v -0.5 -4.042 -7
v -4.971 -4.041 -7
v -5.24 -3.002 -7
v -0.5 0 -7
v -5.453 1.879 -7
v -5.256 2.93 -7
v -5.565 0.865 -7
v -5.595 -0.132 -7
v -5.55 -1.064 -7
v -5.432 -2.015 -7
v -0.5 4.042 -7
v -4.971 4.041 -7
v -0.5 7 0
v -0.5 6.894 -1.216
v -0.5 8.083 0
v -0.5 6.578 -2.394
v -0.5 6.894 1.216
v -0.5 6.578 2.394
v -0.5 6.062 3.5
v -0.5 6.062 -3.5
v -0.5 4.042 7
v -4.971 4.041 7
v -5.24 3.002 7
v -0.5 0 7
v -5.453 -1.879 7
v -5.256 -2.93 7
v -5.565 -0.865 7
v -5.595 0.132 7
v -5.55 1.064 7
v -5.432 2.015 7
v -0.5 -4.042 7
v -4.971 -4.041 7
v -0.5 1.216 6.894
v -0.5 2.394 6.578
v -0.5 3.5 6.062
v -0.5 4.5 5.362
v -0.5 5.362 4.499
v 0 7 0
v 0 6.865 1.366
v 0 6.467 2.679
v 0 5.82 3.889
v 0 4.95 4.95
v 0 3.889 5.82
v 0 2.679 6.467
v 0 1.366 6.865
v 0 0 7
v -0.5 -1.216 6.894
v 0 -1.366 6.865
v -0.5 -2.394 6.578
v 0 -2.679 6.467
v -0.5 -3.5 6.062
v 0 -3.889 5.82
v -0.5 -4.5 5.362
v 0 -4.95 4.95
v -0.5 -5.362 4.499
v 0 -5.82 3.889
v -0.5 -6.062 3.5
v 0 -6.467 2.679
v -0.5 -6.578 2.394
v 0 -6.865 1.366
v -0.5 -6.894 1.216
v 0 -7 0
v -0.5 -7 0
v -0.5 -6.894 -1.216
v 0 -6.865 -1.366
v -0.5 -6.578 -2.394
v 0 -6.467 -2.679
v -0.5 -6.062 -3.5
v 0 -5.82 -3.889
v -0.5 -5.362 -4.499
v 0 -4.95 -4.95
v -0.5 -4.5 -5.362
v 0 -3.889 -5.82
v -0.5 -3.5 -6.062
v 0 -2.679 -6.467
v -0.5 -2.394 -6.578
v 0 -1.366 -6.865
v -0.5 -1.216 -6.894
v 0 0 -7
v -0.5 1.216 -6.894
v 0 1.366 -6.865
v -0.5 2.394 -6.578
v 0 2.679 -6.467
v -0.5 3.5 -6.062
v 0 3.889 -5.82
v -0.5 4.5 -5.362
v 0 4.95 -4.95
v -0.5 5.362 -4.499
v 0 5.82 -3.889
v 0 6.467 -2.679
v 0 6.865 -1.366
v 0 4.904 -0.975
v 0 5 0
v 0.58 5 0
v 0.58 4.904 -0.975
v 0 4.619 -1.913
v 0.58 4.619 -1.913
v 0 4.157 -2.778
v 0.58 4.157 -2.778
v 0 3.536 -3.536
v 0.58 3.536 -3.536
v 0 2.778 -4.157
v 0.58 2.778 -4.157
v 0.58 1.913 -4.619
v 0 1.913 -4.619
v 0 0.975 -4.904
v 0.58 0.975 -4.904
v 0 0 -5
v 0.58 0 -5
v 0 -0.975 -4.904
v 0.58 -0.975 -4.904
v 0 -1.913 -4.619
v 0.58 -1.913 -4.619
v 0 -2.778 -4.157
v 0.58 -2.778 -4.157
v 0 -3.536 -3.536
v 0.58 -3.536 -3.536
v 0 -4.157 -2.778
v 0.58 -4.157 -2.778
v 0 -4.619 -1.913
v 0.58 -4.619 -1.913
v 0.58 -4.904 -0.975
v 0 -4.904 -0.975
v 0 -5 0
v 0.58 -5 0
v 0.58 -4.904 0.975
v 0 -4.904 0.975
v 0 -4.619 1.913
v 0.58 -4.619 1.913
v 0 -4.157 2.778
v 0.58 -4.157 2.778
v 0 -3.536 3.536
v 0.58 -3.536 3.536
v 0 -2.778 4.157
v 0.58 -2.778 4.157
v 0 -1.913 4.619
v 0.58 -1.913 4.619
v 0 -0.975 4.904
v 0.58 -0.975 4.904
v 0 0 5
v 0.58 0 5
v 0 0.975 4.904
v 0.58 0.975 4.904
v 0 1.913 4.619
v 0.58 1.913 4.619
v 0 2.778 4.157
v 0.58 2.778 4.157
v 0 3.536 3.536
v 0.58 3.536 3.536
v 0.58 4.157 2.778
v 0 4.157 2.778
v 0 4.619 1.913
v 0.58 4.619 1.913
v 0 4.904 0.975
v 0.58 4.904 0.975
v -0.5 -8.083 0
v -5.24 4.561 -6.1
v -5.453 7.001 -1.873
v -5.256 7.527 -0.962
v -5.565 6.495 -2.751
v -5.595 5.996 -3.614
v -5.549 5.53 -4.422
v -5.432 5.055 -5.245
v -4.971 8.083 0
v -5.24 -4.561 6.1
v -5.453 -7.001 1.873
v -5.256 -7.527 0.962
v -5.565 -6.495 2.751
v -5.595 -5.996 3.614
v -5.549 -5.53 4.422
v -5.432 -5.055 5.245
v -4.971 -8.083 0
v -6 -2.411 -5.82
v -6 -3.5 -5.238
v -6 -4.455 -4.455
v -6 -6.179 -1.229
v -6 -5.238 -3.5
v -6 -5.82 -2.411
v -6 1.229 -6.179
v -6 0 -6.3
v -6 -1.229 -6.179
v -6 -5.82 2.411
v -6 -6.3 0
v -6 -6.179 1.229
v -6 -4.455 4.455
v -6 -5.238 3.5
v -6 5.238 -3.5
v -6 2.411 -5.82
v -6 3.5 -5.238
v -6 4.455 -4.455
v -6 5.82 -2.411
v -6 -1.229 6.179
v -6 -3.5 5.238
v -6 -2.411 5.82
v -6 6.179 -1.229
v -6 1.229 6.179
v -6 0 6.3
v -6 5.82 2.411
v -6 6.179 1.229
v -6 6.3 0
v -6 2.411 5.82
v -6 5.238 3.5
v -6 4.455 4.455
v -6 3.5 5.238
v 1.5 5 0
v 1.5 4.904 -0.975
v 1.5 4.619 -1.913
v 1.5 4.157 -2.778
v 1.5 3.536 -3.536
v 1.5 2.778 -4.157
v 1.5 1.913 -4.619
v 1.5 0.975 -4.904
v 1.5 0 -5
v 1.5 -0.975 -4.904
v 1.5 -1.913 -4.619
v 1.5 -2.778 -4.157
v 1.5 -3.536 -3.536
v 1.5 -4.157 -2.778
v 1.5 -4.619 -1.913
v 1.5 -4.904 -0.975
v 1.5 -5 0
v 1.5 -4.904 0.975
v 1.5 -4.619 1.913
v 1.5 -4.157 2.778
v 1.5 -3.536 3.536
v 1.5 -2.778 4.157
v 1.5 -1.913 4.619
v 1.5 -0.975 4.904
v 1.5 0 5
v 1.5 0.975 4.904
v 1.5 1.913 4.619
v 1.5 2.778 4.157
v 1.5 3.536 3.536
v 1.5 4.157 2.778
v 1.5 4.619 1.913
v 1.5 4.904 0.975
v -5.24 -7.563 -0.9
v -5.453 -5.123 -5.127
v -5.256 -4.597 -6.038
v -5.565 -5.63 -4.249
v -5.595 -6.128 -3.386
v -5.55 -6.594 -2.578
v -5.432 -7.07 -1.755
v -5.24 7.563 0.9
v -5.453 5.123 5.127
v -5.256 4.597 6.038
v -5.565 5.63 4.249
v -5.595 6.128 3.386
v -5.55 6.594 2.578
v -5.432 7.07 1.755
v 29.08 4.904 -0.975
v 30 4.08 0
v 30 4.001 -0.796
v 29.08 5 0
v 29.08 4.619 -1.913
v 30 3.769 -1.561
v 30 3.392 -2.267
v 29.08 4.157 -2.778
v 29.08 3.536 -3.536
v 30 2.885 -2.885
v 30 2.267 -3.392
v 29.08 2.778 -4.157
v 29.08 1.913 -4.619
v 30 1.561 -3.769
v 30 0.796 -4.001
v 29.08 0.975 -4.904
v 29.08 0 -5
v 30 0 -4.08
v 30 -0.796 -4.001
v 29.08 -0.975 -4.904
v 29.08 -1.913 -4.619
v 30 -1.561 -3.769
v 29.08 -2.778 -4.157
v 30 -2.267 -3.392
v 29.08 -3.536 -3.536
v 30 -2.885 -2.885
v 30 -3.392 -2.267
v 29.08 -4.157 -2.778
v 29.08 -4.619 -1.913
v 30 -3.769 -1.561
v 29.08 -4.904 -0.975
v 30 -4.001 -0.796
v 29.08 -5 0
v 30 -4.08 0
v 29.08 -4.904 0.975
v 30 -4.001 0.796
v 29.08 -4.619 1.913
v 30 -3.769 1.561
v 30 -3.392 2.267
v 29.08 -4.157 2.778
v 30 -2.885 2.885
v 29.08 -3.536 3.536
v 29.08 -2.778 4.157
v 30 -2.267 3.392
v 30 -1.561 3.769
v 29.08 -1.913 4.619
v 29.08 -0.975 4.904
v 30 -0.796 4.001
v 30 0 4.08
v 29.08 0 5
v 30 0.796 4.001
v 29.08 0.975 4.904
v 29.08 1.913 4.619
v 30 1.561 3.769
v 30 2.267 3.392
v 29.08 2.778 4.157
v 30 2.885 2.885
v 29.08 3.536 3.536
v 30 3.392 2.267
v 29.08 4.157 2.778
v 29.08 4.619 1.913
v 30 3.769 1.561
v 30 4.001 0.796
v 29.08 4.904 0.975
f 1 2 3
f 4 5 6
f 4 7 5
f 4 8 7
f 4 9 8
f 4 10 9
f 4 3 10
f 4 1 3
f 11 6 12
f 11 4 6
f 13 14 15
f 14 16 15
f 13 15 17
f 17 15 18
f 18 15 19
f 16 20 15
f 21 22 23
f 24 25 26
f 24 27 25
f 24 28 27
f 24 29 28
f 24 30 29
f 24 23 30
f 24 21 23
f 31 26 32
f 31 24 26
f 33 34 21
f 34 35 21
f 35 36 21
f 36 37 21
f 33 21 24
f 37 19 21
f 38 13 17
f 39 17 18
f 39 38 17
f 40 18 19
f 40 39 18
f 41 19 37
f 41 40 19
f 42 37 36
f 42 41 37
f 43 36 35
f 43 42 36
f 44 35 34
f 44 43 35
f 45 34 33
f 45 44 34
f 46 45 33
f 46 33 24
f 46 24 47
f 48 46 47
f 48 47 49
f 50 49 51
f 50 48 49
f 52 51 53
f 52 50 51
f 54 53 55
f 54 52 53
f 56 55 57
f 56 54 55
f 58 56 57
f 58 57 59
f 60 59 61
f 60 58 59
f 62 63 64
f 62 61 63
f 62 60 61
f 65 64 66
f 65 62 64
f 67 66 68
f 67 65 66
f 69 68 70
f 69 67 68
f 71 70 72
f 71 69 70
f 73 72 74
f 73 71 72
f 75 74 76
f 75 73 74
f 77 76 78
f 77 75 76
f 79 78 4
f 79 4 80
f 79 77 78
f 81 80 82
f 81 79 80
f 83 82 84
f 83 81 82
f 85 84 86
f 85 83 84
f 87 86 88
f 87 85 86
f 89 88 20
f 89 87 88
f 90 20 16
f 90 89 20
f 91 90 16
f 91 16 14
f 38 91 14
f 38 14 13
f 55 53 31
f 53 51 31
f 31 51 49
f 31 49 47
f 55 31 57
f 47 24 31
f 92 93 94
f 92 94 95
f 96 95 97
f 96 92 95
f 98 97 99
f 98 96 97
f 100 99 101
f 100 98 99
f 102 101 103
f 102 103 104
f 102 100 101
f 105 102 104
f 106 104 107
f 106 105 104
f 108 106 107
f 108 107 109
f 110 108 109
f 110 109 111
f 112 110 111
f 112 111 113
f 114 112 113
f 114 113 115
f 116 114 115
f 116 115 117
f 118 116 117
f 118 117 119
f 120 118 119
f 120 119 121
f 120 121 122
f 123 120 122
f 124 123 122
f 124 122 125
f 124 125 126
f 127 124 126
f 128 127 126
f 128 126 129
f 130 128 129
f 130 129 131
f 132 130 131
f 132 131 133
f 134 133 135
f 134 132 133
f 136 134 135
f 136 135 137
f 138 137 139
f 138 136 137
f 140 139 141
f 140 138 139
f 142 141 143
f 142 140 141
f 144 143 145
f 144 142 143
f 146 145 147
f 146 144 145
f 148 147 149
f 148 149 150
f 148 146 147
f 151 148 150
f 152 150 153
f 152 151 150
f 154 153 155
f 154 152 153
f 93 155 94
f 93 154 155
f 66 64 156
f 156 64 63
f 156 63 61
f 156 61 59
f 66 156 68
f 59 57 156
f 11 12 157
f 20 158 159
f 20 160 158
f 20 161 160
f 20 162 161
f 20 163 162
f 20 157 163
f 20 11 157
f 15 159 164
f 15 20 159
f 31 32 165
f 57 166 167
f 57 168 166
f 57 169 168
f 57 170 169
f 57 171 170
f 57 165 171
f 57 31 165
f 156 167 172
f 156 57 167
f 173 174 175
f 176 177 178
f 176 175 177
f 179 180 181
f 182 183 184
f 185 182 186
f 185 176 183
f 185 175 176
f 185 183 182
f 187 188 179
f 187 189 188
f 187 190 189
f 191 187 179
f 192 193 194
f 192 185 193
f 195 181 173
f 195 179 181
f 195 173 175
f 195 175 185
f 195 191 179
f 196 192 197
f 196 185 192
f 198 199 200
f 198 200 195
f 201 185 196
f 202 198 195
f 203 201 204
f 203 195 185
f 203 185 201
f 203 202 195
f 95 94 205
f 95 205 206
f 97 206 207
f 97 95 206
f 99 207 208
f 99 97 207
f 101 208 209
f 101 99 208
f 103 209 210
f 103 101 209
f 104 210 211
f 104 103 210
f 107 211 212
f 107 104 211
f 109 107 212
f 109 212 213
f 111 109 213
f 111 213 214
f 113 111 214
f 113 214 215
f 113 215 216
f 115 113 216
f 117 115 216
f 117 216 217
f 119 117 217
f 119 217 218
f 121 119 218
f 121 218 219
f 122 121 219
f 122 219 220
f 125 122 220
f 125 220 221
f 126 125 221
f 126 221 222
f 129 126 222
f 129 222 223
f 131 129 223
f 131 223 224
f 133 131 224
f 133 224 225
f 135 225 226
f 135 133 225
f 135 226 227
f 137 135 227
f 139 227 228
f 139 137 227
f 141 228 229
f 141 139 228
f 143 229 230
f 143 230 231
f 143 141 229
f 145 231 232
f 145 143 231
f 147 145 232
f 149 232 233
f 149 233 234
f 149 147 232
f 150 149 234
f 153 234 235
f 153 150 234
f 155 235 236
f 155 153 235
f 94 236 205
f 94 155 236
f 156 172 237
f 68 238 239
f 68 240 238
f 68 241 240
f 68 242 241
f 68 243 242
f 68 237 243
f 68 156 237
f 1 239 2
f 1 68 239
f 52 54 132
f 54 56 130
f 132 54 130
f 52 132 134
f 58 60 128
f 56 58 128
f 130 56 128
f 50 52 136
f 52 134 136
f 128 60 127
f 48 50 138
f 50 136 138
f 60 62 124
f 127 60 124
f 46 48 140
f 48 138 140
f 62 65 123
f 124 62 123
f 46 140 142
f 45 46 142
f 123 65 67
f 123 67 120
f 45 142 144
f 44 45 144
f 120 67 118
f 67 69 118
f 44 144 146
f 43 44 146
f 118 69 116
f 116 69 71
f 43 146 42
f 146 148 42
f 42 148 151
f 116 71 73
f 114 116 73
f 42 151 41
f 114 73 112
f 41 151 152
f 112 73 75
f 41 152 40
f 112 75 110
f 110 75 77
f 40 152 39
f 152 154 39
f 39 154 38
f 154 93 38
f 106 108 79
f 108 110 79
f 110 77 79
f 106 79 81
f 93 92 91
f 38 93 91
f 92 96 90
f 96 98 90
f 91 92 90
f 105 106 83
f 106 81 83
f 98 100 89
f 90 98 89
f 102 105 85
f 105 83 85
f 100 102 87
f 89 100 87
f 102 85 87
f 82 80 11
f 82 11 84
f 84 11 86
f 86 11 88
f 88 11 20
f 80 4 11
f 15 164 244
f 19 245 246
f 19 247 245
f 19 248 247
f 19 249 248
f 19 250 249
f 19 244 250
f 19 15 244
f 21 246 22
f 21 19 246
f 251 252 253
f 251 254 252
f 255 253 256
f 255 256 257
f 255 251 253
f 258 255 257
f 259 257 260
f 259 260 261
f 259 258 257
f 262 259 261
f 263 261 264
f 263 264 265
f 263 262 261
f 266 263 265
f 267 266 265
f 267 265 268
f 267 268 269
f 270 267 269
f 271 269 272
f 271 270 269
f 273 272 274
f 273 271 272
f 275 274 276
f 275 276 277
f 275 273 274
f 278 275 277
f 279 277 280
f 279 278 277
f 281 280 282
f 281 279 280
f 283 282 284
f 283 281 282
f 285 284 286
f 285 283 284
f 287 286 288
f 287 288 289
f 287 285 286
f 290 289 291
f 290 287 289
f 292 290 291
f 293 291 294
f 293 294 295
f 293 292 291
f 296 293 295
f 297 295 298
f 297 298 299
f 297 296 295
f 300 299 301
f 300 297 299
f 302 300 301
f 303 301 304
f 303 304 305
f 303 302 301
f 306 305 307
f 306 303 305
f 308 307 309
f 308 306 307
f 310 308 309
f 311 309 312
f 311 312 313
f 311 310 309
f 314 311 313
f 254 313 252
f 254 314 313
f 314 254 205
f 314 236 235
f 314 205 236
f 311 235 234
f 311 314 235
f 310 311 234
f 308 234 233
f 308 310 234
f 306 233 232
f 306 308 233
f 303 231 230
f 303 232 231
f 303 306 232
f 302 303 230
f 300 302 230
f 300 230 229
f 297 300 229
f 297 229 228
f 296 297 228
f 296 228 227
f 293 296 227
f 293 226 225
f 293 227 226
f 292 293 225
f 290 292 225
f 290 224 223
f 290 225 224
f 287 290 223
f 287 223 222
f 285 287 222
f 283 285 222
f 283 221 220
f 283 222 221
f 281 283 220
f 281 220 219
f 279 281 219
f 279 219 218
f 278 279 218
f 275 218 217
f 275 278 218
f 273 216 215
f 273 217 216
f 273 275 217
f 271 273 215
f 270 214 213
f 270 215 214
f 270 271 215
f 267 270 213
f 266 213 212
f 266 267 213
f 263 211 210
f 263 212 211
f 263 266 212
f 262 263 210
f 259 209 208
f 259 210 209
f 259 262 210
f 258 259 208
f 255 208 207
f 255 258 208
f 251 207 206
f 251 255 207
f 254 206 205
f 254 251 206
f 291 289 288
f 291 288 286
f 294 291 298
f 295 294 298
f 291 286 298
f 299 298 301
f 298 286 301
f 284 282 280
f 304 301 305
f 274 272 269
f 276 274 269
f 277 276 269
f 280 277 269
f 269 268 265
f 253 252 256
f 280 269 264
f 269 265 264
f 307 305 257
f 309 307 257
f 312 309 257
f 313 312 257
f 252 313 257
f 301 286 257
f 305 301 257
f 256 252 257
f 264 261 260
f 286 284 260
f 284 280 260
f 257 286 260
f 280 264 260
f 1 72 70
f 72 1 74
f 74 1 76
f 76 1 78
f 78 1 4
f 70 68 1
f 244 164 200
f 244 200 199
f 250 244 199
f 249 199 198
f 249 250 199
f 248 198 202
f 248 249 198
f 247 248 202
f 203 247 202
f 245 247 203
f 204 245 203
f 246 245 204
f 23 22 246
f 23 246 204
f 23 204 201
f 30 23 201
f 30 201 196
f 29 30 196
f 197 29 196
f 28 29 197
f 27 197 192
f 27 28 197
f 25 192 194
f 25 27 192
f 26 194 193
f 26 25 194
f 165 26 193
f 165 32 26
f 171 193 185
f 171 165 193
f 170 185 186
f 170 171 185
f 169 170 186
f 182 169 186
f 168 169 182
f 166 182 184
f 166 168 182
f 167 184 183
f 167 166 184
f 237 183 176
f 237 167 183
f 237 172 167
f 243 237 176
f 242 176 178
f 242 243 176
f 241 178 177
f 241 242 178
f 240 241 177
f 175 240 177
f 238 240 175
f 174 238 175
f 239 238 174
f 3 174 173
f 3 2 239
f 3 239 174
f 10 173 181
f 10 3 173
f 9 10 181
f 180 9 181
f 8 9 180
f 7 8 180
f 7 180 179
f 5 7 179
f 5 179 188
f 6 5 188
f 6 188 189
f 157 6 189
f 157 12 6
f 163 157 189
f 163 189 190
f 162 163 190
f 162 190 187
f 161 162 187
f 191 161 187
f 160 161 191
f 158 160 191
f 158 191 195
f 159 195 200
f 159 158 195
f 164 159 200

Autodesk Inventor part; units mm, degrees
ref_plane "YZ Plane" through (0, 0, 0) normal (1, 0, 0) x (0, 1, 0)
ref_plane "XZ Plane" through (0, 0, 0) normal (0, 1, 0) x (-1, 0, 0)
sketch "Эскиз1" plane through (0, 0, 0) normal (0, 0, 1) x (1, 0, 0)
  line L0 (0, 7) -> (0, 5)
  line L1 (1.5, 5) -> (30, 5)
  line L2 (30, 5) -> (30, 0)
  line L3 (30, 0) -> (-0.5001, 0)
  line L4 (-6.6001, 0) -> (36.1, 0) projected
  line L5 (-0.5001, 0) -> (-0.5001, 7)
  line L6 (-0.5001, 7) -> (0, 7)
  line L7 (1.5, 5) -> (0.5797, 5)
  line L8 (0.5797, 5) -> (0, 5)
  line L9 (0, -1.4) -> (0, 8.4) projected
  dimension "d0" = 30
  dimension "d1" = 28.5
  dimension "d2" = 10
  dimension "d9" = 0.5001
  dimension "d10" = 14
  dimension "d13" = 0.9203
  dimension "d14" = 10
revolve "Базовый элемент" add sketch "Эскиз1" angle 360 about axis through (30, 0, 0) along (-1, 0, 0)
sketch "Эскиз2" plane through (-0.5001, 0, 0) normal (-1, 0, 0) x (0, 0, 1)
  line L0 (0, 8.0829) -> (7, 4.0415)
  line L1 (7, 4.0415) -> (7, -4.0415)
  line L2 (7, -4.0415) -> (0, -8.0829)
  line L3 (0, -8.0829) -> (-7, -4.0415)
  line L4 (-7, -4.0415) -> (-7, 4.0415)
  line L5 (-7, 4.0415) -> (0, 8.0829)
  point P0 (0, 0)
  point P1 (0, 0)
  dimension "d11" = 14
extrude "С головкой" add sketch "Эскиз2" along normal blind 5.5
sketch "Эскиз4" plane through (0, 0, 0) normal (0, 0, 1) x (1, 0, 0)
  line L0 (-6.0001, 6.3) -> (-6.0001, 8.0829)
  line L1 (-6.0001, 8.0829) -> (-4.9707, 8.0829)
  line L2 (-4.9707, 8.0829) -> (-6.0001, 6.3)
  line L3 (-7.1001, 0) -> (0.5999, 0) projected
  line L4 (-0.5001, 8.0829) -> (-6.0001, 8.0829) projected
  line L5 (-6.0001, 4.0415) -> (-6.0001, 8.0829) projected
  dimension "d5" = 30
  dimension "d19" = 12.6
revolve "Фаска1" cut sketch "Эскиз4" angle 360 about axis through (-10, 0, 0) along (1, 0, 0)
thread "Резьба" size "M10x1.5" class "6g" standard "ISO Metric profile" length 28.5
chamfer "Фаска2" distance 0.9202 distance2 0.9203 1 edges at (30, -5, 0) measured on face at (30, -0.2009, 0.1054)
ref_plane "Work Plane1" through (1.525, 0, 0) normal (0, 0, 1) x (1, 0, 0)
equation "\"d0\" = NLG"
equation "\"d1\" = GEL"
equation "\"d2\" = GD"
equation "\"d10\" = SD2"
equation "\"d14\" = BDM"
equation "\"d11\" = SW"
equation "\"d3\" = KOH - SD"
equation "\"d5\" = ANG1"
equation "\"d19\" = SW0"
equation "\"d15\" = GEL"
equation "\"d6\" = -0.5 * SPD + 0.5 * GD"
equation "\"NLG\" = 30"
equation "\"GD\" = NND"
equation "\"BDM\" = NND"
equation "\"KOH\" = 6"
equation "\"GEL\" = 28.5"
equation "\"SW\" = 14"
equation "\"SW0\" = 12.6"
equation "\"SPD\" = NND - 1.2269 * PTC"
equation "\"SD2\" = SW"
equation "\"SD\" = 0.5"
equation "\"ANG1\" = 30deg"
equation "\"GAL\" = 0.61345 * PTC"
equation "\"GUL\" = 0.61345 * PTC"
equation "\"RR\" = 0.1"
equation "\"GD1\" = THREADDIA - 1.2269 * PTC"
equation "\"TOA\" = 30deg"
equation "\"PTC\" = 1.5"
equation "\"E0\" = 1.155 * SW"
equation "\"NND\" = 10"
equation "\"THREADDIA\" = 10"
properties part number "Болт M10-6gx30 ГОСТ 7808-70" material "Сталь, мягкая"
